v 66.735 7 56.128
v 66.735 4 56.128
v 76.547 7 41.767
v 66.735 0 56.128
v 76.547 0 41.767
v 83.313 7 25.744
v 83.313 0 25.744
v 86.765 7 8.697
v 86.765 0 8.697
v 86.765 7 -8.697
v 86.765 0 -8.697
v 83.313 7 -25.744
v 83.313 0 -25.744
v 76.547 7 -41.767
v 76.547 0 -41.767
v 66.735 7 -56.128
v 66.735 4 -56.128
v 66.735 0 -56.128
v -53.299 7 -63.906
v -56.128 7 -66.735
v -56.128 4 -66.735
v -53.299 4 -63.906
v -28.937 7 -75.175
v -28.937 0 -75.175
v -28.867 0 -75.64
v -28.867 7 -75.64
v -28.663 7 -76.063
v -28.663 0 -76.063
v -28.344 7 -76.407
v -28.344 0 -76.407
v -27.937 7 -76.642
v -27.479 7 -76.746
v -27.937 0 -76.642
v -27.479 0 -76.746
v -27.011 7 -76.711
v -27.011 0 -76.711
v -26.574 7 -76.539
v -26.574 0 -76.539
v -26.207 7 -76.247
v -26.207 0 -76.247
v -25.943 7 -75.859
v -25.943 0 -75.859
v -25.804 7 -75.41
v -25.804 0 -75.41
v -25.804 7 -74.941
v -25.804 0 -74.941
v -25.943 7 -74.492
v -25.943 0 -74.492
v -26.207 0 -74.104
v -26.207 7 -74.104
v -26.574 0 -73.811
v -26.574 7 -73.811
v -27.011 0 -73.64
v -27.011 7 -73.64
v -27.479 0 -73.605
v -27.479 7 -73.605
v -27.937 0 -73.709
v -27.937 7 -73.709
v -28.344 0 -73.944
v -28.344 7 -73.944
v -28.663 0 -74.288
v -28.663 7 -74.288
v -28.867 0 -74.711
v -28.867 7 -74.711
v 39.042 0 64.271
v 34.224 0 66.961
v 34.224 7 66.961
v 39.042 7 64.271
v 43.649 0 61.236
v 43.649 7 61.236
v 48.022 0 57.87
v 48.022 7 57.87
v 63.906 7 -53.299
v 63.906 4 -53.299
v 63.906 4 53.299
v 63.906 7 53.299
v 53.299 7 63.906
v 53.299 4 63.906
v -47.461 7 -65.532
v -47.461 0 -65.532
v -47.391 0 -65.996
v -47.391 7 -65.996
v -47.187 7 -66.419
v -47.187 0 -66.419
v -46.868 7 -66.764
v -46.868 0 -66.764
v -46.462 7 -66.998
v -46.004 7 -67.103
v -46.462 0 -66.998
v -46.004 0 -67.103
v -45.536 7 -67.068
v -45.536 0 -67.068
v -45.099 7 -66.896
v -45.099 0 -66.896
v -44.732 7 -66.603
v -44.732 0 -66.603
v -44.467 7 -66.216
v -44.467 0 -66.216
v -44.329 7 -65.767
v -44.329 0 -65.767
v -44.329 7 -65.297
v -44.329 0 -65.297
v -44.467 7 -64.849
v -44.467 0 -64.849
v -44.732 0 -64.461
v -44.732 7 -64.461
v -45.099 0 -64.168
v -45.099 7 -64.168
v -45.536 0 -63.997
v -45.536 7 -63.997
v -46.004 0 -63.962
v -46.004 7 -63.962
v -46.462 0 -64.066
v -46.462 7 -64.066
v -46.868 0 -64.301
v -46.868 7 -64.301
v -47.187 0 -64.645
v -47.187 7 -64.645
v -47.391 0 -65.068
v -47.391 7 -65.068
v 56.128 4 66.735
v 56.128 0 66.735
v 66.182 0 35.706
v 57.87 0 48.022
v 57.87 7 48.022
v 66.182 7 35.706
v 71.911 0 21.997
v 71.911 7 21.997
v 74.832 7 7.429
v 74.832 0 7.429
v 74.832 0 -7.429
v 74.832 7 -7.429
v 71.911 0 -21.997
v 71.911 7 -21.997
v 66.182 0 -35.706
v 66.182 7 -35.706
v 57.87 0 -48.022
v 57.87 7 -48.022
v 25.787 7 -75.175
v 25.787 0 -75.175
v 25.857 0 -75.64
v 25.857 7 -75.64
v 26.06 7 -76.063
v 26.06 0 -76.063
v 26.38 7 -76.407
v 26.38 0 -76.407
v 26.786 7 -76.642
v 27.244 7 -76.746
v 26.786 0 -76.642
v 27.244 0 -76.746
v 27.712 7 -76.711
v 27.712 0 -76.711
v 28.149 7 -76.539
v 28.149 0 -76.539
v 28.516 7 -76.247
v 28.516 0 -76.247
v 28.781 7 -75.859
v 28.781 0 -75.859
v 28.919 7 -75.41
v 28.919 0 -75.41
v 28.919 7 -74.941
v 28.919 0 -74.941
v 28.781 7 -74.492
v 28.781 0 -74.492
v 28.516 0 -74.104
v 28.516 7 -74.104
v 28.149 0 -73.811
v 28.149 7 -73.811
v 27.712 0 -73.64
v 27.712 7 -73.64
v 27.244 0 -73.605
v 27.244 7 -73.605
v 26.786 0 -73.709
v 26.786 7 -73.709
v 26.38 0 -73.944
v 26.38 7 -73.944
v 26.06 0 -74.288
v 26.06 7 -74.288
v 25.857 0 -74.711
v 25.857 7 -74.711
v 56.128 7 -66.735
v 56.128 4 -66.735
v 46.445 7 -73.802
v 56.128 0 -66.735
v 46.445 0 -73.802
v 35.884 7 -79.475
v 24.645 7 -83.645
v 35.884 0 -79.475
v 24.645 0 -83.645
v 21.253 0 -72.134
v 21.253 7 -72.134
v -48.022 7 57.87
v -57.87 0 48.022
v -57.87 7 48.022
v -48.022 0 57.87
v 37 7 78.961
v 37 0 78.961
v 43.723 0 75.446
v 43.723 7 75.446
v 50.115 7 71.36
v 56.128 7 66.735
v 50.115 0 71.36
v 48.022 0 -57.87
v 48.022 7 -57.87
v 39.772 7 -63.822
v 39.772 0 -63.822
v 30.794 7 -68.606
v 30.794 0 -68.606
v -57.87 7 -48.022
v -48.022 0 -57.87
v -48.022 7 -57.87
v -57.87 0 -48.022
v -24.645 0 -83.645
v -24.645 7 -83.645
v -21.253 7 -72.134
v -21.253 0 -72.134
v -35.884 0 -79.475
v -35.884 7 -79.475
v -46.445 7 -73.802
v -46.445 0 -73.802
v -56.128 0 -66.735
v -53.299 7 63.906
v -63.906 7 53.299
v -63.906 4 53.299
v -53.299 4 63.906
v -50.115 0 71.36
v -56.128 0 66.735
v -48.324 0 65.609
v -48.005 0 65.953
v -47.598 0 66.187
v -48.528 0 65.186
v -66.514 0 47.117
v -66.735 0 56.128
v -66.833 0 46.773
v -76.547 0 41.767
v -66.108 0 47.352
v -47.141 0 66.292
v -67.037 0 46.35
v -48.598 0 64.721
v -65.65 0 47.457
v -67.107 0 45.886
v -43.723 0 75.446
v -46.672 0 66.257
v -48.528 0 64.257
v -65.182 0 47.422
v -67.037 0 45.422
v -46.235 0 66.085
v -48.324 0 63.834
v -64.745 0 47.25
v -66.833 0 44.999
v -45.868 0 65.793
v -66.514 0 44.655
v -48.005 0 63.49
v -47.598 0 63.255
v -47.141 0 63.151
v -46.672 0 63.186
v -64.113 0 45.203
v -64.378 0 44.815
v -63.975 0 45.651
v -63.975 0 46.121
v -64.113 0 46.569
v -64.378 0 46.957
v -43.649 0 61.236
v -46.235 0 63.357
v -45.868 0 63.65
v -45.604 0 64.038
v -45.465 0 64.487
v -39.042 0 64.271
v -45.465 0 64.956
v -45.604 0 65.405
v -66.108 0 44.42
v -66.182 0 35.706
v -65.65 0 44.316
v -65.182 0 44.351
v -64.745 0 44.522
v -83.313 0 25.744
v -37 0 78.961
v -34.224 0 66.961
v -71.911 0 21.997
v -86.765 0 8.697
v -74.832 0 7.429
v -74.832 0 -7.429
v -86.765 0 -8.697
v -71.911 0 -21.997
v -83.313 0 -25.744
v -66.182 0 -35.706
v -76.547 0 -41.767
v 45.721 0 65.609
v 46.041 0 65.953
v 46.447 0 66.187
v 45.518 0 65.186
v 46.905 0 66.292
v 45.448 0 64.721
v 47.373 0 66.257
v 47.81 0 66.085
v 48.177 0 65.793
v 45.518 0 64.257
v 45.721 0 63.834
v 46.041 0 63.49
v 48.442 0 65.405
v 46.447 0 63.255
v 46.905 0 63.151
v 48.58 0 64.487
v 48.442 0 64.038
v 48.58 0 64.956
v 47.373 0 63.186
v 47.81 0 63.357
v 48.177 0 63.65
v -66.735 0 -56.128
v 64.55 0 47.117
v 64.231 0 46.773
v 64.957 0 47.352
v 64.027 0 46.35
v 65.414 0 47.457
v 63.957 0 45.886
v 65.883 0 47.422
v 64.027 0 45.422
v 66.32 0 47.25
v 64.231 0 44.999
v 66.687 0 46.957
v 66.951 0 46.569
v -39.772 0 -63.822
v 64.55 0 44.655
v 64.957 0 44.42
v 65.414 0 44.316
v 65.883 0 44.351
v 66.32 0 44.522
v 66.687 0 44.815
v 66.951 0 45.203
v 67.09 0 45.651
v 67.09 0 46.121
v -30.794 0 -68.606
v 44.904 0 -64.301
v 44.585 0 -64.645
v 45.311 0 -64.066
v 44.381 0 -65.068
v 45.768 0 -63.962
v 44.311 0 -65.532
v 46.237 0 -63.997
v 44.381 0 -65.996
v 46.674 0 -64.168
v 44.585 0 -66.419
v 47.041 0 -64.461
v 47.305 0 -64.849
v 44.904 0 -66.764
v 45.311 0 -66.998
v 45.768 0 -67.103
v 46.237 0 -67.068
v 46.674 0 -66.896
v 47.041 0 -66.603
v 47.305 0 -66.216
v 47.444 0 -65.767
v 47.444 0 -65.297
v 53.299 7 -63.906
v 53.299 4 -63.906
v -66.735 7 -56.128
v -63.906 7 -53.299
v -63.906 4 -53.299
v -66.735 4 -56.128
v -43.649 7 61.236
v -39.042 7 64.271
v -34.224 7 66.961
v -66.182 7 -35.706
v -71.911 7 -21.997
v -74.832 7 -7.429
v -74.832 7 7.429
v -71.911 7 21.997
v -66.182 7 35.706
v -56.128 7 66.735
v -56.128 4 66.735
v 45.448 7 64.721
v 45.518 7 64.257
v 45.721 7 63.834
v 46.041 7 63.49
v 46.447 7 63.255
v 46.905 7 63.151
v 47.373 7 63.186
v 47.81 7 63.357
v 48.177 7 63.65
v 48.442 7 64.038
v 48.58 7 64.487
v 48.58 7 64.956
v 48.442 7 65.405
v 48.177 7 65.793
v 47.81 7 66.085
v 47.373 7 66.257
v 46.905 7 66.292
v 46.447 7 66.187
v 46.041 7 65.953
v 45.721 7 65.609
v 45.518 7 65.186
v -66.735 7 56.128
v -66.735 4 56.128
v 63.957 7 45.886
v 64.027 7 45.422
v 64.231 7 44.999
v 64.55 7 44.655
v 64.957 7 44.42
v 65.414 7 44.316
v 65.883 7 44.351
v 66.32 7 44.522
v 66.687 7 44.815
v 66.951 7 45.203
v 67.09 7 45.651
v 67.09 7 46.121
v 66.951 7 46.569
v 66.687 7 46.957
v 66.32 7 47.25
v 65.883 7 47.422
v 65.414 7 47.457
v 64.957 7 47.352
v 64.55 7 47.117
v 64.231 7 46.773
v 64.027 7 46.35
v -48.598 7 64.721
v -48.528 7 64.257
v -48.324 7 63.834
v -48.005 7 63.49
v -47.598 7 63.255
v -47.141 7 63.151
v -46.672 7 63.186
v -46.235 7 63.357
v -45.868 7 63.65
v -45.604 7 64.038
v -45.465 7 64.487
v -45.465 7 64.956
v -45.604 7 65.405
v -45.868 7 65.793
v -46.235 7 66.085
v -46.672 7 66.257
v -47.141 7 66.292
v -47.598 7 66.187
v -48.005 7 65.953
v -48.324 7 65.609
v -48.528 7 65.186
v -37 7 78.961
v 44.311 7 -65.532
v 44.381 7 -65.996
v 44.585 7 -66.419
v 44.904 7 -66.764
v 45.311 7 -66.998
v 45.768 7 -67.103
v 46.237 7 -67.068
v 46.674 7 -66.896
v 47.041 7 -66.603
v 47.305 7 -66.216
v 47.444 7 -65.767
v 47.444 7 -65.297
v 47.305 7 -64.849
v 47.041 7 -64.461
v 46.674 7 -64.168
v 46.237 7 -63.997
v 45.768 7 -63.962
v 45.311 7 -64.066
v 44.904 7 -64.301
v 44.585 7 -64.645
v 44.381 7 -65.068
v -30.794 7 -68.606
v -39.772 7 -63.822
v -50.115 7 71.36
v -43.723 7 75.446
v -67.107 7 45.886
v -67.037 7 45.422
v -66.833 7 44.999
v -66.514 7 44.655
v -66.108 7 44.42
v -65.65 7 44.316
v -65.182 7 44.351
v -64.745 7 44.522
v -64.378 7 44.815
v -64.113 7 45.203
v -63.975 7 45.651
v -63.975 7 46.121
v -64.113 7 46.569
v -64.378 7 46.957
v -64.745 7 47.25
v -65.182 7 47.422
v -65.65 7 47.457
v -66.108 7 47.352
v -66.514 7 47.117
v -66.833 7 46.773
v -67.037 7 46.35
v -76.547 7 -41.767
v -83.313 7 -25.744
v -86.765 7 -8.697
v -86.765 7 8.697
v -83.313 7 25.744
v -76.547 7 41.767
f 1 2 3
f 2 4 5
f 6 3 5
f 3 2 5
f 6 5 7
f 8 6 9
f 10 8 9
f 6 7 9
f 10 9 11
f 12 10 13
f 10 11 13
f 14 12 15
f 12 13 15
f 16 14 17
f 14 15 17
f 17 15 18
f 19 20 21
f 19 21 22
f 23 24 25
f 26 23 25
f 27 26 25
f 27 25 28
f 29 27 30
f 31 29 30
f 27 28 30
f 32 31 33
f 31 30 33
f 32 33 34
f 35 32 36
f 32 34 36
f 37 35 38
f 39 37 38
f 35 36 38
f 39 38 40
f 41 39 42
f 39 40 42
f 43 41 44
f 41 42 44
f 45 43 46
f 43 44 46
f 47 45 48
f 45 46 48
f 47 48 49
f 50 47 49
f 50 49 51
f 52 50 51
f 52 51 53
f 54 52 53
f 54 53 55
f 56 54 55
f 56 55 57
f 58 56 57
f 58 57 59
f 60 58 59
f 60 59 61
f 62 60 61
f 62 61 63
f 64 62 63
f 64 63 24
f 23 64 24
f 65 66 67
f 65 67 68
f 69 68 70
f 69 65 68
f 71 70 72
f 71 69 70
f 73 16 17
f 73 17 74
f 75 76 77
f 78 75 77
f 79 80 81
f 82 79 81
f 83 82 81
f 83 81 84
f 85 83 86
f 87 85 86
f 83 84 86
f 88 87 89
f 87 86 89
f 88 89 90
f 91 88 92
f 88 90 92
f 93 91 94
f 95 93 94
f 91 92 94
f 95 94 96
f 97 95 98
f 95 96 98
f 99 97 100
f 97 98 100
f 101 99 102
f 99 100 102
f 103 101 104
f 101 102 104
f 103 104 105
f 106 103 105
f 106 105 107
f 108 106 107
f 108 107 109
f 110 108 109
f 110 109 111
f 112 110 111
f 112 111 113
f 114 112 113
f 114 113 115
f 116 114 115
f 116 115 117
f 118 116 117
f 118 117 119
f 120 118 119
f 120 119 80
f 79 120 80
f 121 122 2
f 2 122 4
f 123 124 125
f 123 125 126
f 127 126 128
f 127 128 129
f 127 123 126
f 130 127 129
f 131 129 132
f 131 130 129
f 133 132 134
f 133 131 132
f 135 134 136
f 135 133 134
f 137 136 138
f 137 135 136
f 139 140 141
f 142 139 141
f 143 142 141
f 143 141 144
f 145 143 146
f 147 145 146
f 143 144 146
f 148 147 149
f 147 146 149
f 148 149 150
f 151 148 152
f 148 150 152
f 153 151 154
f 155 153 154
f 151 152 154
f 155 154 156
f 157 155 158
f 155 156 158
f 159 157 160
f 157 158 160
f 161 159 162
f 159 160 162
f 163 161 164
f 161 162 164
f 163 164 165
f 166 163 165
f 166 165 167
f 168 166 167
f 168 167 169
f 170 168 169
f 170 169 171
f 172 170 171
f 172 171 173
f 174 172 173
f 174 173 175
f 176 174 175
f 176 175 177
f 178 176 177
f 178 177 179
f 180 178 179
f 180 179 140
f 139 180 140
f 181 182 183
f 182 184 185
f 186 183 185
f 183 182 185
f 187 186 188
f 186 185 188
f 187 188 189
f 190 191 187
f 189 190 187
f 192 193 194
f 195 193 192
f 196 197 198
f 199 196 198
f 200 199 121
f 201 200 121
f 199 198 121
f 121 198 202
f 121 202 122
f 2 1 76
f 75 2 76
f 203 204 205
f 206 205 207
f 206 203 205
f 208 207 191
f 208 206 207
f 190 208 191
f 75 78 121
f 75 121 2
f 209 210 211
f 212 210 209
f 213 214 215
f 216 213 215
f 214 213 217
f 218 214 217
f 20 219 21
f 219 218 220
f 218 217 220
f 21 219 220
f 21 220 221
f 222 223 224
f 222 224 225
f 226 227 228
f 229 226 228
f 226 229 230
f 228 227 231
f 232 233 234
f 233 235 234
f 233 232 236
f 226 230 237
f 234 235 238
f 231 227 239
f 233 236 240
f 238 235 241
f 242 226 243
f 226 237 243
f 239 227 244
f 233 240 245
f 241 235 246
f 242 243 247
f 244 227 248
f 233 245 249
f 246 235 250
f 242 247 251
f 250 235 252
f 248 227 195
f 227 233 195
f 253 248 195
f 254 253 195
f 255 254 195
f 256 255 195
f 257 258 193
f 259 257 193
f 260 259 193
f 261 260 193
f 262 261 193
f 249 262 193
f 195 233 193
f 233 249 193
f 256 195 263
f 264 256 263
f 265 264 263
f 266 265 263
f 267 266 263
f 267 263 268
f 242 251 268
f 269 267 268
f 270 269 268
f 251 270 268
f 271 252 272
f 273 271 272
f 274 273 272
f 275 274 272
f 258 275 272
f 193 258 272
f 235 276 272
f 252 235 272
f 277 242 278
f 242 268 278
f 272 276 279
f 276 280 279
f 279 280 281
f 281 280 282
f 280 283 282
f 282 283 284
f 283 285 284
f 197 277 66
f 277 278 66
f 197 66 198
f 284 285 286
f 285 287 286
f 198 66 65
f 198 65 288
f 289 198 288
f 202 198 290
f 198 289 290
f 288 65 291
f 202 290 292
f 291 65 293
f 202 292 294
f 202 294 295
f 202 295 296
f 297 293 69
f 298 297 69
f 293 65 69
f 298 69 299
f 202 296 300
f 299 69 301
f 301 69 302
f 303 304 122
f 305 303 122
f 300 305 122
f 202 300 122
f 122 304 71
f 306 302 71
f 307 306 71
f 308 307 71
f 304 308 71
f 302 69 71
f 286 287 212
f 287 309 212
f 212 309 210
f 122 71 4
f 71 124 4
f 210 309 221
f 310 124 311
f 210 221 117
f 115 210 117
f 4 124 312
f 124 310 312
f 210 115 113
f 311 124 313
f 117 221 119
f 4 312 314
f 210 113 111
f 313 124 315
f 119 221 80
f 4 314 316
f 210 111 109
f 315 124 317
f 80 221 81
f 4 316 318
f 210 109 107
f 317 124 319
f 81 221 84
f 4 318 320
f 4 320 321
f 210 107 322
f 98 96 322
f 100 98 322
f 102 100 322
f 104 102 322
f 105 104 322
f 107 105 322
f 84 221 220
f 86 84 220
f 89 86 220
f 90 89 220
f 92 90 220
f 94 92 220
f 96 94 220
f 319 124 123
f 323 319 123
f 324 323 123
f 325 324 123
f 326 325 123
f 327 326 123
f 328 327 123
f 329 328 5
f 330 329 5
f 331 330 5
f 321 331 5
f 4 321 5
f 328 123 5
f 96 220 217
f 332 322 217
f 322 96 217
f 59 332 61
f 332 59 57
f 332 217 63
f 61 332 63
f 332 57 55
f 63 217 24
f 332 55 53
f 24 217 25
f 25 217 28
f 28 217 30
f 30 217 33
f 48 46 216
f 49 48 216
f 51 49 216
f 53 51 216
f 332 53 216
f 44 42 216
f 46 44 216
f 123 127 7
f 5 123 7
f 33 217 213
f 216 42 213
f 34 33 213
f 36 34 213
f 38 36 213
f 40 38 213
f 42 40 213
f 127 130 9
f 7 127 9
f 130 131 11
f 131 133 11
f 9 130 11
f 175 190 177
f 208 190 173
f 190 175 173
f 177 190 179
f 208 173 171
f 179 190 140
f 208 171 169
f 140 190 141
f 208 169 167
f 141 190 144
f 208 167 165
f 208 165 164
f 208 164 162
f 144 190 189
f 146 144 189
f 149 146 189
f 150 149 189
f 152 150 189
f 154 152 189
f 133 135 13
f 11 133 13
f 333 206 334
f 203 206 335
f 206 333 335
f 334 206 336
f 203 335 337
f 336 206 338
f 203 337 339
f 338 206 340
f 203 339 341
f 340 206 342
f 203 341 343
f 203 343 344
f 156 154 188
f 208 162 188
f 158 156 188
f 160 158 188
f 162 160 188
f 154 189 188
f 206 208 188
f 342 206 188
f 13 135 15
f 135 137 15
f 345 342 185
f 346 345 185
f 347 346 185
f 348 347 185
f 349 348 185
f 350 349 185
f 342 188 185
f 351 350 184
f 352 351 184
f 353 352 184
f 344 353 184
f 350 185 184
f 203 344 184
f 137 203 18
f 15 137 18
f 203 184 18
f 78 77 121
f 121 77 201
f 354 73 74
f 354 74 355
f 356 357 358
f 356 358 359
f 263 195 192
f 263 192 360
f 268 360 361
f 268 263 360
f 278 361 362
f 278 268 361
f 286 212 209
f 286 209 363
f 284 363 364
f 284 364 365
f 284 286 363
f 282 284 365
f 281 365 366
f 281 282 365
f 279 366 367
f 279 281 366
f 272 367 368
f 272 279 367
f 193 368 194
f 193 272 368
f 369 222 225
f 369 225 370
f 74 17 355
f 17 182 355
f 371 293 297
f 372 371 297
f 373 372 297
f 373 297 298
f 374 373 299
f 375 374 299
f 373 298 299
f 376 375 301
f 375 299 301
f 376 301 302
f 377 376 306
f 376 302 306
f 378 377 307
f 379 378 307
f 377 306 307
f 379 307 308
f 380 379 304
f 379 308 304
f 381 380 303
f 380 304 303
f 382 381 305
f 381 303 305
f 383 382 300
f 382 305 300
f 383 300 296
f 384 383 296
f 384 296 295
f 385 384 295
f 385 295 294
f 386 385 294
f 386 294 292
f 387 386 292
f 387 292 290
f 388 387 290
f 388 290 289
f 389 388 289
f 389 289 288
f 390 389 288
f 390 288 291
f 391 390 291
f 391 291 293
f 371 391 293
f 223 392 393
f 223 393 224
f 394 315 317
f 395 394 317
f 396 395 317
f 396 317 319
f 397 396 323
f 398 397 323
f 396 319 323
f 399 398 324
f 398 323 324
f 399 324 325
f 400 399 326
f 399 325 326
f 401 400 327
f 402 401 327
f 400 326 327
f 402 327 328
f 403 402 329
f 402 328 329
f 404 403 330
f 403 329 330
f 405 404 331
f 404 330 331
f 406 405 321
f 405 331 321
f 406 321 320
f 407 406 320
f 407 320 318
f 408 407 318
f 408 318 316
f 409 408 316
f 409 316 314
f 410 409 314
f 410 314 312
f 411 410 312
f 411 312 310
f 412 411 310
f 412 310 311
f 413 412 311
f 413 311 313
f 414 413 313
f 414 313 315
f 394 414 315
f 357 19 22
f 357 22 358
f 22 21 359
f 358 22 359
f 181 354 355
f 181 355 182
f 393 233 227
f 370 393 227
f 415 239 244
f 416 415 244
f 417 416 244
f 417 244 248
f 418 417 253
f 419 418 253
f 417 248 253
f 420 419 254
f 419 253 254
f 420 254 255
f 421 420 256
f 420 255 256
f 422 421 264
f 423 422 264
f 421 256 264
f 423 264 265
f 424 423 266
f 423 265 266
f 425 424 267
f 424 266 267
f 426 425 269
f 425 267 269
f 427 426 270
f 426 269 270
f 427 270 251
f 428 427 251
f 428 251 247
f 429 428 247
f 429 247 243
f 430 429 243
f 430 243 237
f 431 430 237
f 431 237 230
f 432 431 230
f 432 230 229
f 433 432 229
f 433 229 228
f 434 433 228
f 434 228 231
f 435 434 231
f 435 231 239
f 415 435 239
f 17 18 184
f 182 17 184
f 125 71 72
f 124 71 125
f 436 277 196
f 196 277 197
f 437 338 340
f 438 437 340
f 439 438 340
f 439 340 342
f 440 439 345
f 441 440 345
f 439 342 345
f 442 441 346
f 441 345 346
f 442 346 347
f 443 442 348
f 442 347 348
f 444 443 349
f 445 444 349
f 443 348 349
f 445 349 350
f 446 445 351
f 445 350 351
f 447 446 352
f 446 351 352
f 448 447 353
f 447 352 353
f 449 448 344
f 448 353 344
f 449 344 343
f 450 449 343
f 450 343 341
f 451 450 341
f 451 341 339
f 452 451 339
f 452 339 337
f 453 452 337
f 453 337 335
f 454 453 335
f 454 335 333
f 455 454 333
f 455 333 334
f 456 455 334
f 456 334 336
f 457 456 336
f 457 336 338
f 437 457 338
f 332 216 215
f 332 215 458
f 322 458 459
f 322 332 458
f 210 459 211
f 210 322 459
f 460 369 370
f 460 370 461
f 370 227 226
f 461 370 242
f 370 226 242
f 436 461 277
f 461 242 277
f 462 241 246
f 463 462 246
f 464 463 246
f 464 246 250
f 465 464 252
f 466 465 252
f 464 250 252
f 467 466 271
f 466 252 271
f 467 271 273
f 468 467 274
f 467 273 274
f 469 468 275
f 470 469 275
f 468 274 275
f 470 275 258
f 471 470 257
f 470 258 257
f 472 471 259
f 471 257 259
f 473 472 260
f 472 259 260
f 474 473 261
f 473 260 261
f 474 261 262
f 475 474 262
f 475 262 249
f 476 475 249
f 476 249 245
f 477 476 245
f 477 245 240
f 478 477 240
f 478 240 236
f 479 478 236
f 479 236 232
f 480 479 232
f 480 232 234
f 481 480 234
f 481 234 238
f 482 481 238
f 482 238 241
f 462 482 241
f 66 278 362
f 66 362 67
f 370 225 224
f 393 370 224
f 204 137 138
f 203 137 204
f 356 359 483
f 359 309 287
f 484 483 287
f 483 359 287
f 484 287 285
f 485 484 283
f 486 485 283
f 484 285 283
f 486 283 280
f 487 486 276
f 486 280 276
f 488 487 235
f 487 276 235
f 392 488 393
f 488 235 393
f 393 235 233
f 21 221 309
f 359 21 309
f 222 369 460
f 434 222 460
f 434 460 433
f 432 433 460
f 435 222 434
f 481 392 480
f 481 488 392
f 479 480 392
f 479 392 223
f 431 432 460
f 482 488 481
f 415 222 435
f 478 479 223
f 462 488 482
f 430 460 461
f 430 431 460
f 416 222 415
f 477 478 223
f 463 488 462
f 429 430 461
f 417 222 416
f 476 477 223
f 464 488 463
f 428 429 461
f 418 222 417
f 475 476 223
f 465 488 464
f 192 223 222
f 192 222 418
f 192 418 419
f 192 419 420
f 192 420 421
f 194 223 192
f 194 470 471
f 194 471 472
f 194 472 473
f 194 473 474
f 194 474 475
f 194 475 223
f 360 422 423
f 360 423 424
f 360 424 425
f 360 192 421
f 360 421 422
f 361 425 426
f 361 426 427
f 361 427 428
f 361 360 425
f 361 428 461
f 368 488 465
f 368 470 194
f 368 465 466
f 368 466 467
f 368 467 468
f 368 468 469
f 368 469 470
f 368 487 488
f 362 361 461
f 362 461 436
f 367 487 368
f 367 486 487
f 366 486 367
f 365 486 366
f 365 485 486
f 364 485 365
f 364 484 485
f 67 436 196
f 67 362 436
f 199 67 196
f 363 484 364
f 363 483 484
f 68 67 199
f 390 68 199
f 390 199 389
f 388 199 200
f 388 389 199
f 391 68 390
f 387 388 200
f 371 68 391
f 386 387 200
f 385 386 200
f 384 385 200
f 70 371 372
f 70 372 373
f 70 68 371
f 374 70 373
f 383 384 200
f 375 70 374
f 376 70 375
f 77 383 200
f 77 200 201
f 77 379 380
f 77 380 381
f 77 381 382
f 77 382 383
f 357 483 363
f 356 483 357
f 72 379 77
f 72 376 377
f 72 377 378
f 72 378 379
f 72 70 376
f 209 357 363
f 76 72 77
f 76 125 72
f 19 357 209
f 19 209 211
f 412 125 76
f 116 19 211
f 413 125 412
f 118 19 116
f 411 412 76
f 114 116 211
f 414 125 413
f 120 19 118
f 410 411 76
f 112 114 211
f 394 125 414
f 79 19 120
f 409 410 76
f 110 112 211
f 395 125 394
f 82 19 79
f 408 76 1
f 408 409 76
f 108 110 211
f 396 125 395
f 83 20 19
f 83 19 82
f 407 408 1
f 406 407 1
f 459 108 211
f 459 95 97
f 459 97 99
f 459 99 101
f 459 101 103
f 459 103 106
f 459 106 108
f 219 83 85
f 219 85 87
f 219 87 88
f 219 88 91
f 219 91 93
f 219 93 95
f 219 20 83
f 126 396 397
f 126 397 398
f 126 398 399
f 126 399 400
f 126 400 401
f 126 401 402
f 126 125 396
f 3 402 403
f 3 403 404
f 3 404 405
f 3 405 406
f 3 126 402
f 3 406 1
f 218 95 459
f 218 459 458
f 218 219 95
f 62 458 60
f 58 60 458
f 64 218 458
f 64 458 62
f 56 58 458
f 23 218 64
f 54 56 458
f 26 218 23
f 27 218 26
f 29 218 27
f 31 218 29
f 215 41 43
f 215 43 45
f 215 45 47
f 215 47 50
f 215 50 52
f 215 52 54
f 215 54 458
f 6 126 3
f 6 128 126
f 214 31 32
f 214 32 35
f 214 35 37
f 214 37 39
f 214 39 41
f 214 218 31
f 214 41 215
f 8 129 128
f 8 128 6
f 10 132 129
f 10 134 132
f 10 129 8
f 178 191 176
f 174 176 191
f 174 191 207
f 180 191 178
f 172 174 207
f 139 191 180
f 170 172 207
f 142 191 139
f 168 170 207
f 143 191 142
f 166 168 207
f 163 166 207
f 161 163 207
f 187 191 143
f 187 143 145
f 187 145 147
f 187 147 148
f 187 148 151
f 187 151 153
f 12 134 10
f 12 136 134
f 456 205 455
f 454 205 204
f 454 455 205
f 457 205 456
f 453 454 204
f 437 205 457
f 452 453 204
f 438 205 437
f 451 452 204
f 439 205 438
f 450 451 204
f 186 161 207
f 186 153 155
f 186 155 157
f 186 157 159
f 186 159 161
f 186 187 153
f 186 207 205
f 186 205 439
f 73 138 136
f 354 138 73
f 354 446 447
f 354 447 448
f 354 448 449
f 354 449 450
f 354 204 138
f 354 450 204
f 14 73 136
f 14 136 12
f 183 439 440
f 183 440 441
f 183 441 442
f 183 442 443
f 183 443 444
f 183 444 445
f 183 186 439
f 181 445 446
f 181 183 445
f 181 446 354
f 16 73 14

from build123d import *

# Parameters (mm, degrees)
RESSALTO_EXTRUS_O1_DEPTH                = 7
CASCA1_DEPTH                            = 7
FURO_ROSCADO_PARA_CONDU_TE_DE_M3X0_51_D = 3.15
CORTE_EXTRUS_O1_DEPTH                   = 124.517933921
CORTE_EXTRUS_O2_DEPTH                   = 3


# Read off the part's stored shape, not the designer's step: Casca1
with BuildPart() as part:
    # Esboço1 → Ressalto-extrusão1 (new body)
    with BuildSketch(Plane(origin=(0, 0, 0), x_dir=(1, 0, 0), z_dir=(0, 1, 0))):
        with BuildLine():
            Line((-37, -78.961003033), (37, -78.961003033))
            ThreePointArc((37, -78.961003033), (46.963540288, -73.472892169), (56.127920845, -66.734522563))
            Line((56.127920845, -66.734522563), (66.734522563, -56.127920845))
            ThreePointArc((66.734522563, -56.127920845), (87.2, 0), (66.734522563, 56.127920845))
            Line((66.734522563, 56.127920845), (56.127920845, 66.734522563))
            ThreePointArc((56.127920845, 66.734522563), (0, 87.2), (-56.127920845, 66.734522563))
            Line((-56.127920845, 66.734522563), (-66.734522563, 56.127920845))
            ThreePointArc((-66.734522563, 56.127920845), (-87.2, 0), (-66.734522563, -56.127920845))
            Line((-66.734522563, -56.127920845), (-56.127920845, -66.734522563))
            ThreePointArc((-56.127920845, -66.734522563), (-46.963540288, -73.472892169), (-37, -78.961003033))
        make_face()
    extrude(amount=RESSALTO_EXTRUS_O1_DEPTH)

    # Casca1 outline → Casca1 (cut)
    with BuildSketch(Plane(origin=(0, 0, 0), x_dir=(1, 0, 0), z_dir=(0, 1, 0))):
        with BuildLine():
            ThreePointArc((-57.870105501, 48.021775158), (-75.2, 0), (-57.870105501, -48.021775158))
            Line((-57.870105501, -48.021775158), (-48.021775158, -57.870105501))
            ThreePointArc((-48.021775158, -57.870105501), (-41.373205231, -62.795683681), (-34.223735518, -66.961003033))
            Line((-34.223735518, -66.961003033), (34.223735518, -66.961003033))
            ThreePointArc((34.223735518, -66.961003033), (41.373205231, -62.795683681), (48.021775158, -57.870105501))
            Line((48.021775158, -57.870105501), (57.870105501, -48.021775158))
            ThreePointArc((57.870105501, -48.021775158), (75.2, 0), (57.870105501, 48.021775158))
            Line((57.870105501, 48.021775158), (48.021775158, 57.870105501))
            ThreePointArc((48.021775158, 57.870105501), (0, 75.2), (-48.021775158, 57.870105501))
            Line((-48.021775158, 57.870105501), (-57.870105501, 48.021775158))
        make_face()
    extrude(amount=CASCA1_DEPTH, mode=Mode.SUBTRACT)

    # Furo roscado para conduíte de M3x0.51 (through all)
    with Locations(Plane(origin=(0, 7, 0), x_dir=(1, 0, 0), z_dir=(0, 1, 0))):
        with Locations((-27.361611466, 75.175409663), (-47.022820183, -64.72135955), (47.022820183, -64.72135955), (27.361611466, 75.175409663), (-65.532163543, -45.886114908), (-45.886114908, 65.532163543), (65.532163543, -45.886114908), (45.886114908, 65.532163543)):
            Hole(FURO_ROSCADO_PARA_CONDU_TE_DE_M3X0_51_D / 2)

    # Esboço5 → Corte-extrusão1 (cut, through all)
    with BuildSketch(Plane(origin=(0, 7, 0), x_dir=(1, 0, 0), z_dir=(0, 1, 0))):
        with BuildLine():
            Line((-24.644524413, 83.645008318), (-21.253076099, 72.134227357))
            ThreePointArc((-21.253076099, 72.134227357), (0, 75.2), (21.253076099, 72.134227357))
            Line((21.253076099, 72.134227357), (24.644524413, 83.645008318))
            ThreePointArc((24.644524413, 83.645008318), (0, 87.2), (-24.644524413, 83.645008318))
        make_face()
    extrude(amount=-CORTE_EXTRUS_O1_DEPTH, mode=Mode.SUBTRACT)

    # Esboço8 → Corte-extrusão2 (cut)
    with BuildSketch(Plane(origin=(0, 7, 0), x_dir=(1, 0, 0), z_dir=(0, 1, 0))):
        Polygon((-66.734522563, -56.127920845), (-63.906095438, -53.29949372), (-53.29949372, -63.906095438), (-56.127920845, -66.734522563), align=None)
        Polygon((-56.127920845, 66.734522563), (-53.29949372, 63.906095438), (-63.906095438, 53.29949372), (-66.734522563, 56.127920845), align=None)
        Polygon((66.734522563, -56.127920845), (63.906095438, -53.29949372), (53.29949372, -63.906095438), (56.127920845, -66.734522563), align=None)
        Polygon((66.734522563, 56.127920845), (63.906095438, 53.29949372), (53.29949372, 63.906095438), (56.127920845, 66.734522563), align=None)
    extrude(amount=-CORTE_EXTRUS_O2_DEPTH, mode=Mode.SUBTRACT)


solid = part.part
